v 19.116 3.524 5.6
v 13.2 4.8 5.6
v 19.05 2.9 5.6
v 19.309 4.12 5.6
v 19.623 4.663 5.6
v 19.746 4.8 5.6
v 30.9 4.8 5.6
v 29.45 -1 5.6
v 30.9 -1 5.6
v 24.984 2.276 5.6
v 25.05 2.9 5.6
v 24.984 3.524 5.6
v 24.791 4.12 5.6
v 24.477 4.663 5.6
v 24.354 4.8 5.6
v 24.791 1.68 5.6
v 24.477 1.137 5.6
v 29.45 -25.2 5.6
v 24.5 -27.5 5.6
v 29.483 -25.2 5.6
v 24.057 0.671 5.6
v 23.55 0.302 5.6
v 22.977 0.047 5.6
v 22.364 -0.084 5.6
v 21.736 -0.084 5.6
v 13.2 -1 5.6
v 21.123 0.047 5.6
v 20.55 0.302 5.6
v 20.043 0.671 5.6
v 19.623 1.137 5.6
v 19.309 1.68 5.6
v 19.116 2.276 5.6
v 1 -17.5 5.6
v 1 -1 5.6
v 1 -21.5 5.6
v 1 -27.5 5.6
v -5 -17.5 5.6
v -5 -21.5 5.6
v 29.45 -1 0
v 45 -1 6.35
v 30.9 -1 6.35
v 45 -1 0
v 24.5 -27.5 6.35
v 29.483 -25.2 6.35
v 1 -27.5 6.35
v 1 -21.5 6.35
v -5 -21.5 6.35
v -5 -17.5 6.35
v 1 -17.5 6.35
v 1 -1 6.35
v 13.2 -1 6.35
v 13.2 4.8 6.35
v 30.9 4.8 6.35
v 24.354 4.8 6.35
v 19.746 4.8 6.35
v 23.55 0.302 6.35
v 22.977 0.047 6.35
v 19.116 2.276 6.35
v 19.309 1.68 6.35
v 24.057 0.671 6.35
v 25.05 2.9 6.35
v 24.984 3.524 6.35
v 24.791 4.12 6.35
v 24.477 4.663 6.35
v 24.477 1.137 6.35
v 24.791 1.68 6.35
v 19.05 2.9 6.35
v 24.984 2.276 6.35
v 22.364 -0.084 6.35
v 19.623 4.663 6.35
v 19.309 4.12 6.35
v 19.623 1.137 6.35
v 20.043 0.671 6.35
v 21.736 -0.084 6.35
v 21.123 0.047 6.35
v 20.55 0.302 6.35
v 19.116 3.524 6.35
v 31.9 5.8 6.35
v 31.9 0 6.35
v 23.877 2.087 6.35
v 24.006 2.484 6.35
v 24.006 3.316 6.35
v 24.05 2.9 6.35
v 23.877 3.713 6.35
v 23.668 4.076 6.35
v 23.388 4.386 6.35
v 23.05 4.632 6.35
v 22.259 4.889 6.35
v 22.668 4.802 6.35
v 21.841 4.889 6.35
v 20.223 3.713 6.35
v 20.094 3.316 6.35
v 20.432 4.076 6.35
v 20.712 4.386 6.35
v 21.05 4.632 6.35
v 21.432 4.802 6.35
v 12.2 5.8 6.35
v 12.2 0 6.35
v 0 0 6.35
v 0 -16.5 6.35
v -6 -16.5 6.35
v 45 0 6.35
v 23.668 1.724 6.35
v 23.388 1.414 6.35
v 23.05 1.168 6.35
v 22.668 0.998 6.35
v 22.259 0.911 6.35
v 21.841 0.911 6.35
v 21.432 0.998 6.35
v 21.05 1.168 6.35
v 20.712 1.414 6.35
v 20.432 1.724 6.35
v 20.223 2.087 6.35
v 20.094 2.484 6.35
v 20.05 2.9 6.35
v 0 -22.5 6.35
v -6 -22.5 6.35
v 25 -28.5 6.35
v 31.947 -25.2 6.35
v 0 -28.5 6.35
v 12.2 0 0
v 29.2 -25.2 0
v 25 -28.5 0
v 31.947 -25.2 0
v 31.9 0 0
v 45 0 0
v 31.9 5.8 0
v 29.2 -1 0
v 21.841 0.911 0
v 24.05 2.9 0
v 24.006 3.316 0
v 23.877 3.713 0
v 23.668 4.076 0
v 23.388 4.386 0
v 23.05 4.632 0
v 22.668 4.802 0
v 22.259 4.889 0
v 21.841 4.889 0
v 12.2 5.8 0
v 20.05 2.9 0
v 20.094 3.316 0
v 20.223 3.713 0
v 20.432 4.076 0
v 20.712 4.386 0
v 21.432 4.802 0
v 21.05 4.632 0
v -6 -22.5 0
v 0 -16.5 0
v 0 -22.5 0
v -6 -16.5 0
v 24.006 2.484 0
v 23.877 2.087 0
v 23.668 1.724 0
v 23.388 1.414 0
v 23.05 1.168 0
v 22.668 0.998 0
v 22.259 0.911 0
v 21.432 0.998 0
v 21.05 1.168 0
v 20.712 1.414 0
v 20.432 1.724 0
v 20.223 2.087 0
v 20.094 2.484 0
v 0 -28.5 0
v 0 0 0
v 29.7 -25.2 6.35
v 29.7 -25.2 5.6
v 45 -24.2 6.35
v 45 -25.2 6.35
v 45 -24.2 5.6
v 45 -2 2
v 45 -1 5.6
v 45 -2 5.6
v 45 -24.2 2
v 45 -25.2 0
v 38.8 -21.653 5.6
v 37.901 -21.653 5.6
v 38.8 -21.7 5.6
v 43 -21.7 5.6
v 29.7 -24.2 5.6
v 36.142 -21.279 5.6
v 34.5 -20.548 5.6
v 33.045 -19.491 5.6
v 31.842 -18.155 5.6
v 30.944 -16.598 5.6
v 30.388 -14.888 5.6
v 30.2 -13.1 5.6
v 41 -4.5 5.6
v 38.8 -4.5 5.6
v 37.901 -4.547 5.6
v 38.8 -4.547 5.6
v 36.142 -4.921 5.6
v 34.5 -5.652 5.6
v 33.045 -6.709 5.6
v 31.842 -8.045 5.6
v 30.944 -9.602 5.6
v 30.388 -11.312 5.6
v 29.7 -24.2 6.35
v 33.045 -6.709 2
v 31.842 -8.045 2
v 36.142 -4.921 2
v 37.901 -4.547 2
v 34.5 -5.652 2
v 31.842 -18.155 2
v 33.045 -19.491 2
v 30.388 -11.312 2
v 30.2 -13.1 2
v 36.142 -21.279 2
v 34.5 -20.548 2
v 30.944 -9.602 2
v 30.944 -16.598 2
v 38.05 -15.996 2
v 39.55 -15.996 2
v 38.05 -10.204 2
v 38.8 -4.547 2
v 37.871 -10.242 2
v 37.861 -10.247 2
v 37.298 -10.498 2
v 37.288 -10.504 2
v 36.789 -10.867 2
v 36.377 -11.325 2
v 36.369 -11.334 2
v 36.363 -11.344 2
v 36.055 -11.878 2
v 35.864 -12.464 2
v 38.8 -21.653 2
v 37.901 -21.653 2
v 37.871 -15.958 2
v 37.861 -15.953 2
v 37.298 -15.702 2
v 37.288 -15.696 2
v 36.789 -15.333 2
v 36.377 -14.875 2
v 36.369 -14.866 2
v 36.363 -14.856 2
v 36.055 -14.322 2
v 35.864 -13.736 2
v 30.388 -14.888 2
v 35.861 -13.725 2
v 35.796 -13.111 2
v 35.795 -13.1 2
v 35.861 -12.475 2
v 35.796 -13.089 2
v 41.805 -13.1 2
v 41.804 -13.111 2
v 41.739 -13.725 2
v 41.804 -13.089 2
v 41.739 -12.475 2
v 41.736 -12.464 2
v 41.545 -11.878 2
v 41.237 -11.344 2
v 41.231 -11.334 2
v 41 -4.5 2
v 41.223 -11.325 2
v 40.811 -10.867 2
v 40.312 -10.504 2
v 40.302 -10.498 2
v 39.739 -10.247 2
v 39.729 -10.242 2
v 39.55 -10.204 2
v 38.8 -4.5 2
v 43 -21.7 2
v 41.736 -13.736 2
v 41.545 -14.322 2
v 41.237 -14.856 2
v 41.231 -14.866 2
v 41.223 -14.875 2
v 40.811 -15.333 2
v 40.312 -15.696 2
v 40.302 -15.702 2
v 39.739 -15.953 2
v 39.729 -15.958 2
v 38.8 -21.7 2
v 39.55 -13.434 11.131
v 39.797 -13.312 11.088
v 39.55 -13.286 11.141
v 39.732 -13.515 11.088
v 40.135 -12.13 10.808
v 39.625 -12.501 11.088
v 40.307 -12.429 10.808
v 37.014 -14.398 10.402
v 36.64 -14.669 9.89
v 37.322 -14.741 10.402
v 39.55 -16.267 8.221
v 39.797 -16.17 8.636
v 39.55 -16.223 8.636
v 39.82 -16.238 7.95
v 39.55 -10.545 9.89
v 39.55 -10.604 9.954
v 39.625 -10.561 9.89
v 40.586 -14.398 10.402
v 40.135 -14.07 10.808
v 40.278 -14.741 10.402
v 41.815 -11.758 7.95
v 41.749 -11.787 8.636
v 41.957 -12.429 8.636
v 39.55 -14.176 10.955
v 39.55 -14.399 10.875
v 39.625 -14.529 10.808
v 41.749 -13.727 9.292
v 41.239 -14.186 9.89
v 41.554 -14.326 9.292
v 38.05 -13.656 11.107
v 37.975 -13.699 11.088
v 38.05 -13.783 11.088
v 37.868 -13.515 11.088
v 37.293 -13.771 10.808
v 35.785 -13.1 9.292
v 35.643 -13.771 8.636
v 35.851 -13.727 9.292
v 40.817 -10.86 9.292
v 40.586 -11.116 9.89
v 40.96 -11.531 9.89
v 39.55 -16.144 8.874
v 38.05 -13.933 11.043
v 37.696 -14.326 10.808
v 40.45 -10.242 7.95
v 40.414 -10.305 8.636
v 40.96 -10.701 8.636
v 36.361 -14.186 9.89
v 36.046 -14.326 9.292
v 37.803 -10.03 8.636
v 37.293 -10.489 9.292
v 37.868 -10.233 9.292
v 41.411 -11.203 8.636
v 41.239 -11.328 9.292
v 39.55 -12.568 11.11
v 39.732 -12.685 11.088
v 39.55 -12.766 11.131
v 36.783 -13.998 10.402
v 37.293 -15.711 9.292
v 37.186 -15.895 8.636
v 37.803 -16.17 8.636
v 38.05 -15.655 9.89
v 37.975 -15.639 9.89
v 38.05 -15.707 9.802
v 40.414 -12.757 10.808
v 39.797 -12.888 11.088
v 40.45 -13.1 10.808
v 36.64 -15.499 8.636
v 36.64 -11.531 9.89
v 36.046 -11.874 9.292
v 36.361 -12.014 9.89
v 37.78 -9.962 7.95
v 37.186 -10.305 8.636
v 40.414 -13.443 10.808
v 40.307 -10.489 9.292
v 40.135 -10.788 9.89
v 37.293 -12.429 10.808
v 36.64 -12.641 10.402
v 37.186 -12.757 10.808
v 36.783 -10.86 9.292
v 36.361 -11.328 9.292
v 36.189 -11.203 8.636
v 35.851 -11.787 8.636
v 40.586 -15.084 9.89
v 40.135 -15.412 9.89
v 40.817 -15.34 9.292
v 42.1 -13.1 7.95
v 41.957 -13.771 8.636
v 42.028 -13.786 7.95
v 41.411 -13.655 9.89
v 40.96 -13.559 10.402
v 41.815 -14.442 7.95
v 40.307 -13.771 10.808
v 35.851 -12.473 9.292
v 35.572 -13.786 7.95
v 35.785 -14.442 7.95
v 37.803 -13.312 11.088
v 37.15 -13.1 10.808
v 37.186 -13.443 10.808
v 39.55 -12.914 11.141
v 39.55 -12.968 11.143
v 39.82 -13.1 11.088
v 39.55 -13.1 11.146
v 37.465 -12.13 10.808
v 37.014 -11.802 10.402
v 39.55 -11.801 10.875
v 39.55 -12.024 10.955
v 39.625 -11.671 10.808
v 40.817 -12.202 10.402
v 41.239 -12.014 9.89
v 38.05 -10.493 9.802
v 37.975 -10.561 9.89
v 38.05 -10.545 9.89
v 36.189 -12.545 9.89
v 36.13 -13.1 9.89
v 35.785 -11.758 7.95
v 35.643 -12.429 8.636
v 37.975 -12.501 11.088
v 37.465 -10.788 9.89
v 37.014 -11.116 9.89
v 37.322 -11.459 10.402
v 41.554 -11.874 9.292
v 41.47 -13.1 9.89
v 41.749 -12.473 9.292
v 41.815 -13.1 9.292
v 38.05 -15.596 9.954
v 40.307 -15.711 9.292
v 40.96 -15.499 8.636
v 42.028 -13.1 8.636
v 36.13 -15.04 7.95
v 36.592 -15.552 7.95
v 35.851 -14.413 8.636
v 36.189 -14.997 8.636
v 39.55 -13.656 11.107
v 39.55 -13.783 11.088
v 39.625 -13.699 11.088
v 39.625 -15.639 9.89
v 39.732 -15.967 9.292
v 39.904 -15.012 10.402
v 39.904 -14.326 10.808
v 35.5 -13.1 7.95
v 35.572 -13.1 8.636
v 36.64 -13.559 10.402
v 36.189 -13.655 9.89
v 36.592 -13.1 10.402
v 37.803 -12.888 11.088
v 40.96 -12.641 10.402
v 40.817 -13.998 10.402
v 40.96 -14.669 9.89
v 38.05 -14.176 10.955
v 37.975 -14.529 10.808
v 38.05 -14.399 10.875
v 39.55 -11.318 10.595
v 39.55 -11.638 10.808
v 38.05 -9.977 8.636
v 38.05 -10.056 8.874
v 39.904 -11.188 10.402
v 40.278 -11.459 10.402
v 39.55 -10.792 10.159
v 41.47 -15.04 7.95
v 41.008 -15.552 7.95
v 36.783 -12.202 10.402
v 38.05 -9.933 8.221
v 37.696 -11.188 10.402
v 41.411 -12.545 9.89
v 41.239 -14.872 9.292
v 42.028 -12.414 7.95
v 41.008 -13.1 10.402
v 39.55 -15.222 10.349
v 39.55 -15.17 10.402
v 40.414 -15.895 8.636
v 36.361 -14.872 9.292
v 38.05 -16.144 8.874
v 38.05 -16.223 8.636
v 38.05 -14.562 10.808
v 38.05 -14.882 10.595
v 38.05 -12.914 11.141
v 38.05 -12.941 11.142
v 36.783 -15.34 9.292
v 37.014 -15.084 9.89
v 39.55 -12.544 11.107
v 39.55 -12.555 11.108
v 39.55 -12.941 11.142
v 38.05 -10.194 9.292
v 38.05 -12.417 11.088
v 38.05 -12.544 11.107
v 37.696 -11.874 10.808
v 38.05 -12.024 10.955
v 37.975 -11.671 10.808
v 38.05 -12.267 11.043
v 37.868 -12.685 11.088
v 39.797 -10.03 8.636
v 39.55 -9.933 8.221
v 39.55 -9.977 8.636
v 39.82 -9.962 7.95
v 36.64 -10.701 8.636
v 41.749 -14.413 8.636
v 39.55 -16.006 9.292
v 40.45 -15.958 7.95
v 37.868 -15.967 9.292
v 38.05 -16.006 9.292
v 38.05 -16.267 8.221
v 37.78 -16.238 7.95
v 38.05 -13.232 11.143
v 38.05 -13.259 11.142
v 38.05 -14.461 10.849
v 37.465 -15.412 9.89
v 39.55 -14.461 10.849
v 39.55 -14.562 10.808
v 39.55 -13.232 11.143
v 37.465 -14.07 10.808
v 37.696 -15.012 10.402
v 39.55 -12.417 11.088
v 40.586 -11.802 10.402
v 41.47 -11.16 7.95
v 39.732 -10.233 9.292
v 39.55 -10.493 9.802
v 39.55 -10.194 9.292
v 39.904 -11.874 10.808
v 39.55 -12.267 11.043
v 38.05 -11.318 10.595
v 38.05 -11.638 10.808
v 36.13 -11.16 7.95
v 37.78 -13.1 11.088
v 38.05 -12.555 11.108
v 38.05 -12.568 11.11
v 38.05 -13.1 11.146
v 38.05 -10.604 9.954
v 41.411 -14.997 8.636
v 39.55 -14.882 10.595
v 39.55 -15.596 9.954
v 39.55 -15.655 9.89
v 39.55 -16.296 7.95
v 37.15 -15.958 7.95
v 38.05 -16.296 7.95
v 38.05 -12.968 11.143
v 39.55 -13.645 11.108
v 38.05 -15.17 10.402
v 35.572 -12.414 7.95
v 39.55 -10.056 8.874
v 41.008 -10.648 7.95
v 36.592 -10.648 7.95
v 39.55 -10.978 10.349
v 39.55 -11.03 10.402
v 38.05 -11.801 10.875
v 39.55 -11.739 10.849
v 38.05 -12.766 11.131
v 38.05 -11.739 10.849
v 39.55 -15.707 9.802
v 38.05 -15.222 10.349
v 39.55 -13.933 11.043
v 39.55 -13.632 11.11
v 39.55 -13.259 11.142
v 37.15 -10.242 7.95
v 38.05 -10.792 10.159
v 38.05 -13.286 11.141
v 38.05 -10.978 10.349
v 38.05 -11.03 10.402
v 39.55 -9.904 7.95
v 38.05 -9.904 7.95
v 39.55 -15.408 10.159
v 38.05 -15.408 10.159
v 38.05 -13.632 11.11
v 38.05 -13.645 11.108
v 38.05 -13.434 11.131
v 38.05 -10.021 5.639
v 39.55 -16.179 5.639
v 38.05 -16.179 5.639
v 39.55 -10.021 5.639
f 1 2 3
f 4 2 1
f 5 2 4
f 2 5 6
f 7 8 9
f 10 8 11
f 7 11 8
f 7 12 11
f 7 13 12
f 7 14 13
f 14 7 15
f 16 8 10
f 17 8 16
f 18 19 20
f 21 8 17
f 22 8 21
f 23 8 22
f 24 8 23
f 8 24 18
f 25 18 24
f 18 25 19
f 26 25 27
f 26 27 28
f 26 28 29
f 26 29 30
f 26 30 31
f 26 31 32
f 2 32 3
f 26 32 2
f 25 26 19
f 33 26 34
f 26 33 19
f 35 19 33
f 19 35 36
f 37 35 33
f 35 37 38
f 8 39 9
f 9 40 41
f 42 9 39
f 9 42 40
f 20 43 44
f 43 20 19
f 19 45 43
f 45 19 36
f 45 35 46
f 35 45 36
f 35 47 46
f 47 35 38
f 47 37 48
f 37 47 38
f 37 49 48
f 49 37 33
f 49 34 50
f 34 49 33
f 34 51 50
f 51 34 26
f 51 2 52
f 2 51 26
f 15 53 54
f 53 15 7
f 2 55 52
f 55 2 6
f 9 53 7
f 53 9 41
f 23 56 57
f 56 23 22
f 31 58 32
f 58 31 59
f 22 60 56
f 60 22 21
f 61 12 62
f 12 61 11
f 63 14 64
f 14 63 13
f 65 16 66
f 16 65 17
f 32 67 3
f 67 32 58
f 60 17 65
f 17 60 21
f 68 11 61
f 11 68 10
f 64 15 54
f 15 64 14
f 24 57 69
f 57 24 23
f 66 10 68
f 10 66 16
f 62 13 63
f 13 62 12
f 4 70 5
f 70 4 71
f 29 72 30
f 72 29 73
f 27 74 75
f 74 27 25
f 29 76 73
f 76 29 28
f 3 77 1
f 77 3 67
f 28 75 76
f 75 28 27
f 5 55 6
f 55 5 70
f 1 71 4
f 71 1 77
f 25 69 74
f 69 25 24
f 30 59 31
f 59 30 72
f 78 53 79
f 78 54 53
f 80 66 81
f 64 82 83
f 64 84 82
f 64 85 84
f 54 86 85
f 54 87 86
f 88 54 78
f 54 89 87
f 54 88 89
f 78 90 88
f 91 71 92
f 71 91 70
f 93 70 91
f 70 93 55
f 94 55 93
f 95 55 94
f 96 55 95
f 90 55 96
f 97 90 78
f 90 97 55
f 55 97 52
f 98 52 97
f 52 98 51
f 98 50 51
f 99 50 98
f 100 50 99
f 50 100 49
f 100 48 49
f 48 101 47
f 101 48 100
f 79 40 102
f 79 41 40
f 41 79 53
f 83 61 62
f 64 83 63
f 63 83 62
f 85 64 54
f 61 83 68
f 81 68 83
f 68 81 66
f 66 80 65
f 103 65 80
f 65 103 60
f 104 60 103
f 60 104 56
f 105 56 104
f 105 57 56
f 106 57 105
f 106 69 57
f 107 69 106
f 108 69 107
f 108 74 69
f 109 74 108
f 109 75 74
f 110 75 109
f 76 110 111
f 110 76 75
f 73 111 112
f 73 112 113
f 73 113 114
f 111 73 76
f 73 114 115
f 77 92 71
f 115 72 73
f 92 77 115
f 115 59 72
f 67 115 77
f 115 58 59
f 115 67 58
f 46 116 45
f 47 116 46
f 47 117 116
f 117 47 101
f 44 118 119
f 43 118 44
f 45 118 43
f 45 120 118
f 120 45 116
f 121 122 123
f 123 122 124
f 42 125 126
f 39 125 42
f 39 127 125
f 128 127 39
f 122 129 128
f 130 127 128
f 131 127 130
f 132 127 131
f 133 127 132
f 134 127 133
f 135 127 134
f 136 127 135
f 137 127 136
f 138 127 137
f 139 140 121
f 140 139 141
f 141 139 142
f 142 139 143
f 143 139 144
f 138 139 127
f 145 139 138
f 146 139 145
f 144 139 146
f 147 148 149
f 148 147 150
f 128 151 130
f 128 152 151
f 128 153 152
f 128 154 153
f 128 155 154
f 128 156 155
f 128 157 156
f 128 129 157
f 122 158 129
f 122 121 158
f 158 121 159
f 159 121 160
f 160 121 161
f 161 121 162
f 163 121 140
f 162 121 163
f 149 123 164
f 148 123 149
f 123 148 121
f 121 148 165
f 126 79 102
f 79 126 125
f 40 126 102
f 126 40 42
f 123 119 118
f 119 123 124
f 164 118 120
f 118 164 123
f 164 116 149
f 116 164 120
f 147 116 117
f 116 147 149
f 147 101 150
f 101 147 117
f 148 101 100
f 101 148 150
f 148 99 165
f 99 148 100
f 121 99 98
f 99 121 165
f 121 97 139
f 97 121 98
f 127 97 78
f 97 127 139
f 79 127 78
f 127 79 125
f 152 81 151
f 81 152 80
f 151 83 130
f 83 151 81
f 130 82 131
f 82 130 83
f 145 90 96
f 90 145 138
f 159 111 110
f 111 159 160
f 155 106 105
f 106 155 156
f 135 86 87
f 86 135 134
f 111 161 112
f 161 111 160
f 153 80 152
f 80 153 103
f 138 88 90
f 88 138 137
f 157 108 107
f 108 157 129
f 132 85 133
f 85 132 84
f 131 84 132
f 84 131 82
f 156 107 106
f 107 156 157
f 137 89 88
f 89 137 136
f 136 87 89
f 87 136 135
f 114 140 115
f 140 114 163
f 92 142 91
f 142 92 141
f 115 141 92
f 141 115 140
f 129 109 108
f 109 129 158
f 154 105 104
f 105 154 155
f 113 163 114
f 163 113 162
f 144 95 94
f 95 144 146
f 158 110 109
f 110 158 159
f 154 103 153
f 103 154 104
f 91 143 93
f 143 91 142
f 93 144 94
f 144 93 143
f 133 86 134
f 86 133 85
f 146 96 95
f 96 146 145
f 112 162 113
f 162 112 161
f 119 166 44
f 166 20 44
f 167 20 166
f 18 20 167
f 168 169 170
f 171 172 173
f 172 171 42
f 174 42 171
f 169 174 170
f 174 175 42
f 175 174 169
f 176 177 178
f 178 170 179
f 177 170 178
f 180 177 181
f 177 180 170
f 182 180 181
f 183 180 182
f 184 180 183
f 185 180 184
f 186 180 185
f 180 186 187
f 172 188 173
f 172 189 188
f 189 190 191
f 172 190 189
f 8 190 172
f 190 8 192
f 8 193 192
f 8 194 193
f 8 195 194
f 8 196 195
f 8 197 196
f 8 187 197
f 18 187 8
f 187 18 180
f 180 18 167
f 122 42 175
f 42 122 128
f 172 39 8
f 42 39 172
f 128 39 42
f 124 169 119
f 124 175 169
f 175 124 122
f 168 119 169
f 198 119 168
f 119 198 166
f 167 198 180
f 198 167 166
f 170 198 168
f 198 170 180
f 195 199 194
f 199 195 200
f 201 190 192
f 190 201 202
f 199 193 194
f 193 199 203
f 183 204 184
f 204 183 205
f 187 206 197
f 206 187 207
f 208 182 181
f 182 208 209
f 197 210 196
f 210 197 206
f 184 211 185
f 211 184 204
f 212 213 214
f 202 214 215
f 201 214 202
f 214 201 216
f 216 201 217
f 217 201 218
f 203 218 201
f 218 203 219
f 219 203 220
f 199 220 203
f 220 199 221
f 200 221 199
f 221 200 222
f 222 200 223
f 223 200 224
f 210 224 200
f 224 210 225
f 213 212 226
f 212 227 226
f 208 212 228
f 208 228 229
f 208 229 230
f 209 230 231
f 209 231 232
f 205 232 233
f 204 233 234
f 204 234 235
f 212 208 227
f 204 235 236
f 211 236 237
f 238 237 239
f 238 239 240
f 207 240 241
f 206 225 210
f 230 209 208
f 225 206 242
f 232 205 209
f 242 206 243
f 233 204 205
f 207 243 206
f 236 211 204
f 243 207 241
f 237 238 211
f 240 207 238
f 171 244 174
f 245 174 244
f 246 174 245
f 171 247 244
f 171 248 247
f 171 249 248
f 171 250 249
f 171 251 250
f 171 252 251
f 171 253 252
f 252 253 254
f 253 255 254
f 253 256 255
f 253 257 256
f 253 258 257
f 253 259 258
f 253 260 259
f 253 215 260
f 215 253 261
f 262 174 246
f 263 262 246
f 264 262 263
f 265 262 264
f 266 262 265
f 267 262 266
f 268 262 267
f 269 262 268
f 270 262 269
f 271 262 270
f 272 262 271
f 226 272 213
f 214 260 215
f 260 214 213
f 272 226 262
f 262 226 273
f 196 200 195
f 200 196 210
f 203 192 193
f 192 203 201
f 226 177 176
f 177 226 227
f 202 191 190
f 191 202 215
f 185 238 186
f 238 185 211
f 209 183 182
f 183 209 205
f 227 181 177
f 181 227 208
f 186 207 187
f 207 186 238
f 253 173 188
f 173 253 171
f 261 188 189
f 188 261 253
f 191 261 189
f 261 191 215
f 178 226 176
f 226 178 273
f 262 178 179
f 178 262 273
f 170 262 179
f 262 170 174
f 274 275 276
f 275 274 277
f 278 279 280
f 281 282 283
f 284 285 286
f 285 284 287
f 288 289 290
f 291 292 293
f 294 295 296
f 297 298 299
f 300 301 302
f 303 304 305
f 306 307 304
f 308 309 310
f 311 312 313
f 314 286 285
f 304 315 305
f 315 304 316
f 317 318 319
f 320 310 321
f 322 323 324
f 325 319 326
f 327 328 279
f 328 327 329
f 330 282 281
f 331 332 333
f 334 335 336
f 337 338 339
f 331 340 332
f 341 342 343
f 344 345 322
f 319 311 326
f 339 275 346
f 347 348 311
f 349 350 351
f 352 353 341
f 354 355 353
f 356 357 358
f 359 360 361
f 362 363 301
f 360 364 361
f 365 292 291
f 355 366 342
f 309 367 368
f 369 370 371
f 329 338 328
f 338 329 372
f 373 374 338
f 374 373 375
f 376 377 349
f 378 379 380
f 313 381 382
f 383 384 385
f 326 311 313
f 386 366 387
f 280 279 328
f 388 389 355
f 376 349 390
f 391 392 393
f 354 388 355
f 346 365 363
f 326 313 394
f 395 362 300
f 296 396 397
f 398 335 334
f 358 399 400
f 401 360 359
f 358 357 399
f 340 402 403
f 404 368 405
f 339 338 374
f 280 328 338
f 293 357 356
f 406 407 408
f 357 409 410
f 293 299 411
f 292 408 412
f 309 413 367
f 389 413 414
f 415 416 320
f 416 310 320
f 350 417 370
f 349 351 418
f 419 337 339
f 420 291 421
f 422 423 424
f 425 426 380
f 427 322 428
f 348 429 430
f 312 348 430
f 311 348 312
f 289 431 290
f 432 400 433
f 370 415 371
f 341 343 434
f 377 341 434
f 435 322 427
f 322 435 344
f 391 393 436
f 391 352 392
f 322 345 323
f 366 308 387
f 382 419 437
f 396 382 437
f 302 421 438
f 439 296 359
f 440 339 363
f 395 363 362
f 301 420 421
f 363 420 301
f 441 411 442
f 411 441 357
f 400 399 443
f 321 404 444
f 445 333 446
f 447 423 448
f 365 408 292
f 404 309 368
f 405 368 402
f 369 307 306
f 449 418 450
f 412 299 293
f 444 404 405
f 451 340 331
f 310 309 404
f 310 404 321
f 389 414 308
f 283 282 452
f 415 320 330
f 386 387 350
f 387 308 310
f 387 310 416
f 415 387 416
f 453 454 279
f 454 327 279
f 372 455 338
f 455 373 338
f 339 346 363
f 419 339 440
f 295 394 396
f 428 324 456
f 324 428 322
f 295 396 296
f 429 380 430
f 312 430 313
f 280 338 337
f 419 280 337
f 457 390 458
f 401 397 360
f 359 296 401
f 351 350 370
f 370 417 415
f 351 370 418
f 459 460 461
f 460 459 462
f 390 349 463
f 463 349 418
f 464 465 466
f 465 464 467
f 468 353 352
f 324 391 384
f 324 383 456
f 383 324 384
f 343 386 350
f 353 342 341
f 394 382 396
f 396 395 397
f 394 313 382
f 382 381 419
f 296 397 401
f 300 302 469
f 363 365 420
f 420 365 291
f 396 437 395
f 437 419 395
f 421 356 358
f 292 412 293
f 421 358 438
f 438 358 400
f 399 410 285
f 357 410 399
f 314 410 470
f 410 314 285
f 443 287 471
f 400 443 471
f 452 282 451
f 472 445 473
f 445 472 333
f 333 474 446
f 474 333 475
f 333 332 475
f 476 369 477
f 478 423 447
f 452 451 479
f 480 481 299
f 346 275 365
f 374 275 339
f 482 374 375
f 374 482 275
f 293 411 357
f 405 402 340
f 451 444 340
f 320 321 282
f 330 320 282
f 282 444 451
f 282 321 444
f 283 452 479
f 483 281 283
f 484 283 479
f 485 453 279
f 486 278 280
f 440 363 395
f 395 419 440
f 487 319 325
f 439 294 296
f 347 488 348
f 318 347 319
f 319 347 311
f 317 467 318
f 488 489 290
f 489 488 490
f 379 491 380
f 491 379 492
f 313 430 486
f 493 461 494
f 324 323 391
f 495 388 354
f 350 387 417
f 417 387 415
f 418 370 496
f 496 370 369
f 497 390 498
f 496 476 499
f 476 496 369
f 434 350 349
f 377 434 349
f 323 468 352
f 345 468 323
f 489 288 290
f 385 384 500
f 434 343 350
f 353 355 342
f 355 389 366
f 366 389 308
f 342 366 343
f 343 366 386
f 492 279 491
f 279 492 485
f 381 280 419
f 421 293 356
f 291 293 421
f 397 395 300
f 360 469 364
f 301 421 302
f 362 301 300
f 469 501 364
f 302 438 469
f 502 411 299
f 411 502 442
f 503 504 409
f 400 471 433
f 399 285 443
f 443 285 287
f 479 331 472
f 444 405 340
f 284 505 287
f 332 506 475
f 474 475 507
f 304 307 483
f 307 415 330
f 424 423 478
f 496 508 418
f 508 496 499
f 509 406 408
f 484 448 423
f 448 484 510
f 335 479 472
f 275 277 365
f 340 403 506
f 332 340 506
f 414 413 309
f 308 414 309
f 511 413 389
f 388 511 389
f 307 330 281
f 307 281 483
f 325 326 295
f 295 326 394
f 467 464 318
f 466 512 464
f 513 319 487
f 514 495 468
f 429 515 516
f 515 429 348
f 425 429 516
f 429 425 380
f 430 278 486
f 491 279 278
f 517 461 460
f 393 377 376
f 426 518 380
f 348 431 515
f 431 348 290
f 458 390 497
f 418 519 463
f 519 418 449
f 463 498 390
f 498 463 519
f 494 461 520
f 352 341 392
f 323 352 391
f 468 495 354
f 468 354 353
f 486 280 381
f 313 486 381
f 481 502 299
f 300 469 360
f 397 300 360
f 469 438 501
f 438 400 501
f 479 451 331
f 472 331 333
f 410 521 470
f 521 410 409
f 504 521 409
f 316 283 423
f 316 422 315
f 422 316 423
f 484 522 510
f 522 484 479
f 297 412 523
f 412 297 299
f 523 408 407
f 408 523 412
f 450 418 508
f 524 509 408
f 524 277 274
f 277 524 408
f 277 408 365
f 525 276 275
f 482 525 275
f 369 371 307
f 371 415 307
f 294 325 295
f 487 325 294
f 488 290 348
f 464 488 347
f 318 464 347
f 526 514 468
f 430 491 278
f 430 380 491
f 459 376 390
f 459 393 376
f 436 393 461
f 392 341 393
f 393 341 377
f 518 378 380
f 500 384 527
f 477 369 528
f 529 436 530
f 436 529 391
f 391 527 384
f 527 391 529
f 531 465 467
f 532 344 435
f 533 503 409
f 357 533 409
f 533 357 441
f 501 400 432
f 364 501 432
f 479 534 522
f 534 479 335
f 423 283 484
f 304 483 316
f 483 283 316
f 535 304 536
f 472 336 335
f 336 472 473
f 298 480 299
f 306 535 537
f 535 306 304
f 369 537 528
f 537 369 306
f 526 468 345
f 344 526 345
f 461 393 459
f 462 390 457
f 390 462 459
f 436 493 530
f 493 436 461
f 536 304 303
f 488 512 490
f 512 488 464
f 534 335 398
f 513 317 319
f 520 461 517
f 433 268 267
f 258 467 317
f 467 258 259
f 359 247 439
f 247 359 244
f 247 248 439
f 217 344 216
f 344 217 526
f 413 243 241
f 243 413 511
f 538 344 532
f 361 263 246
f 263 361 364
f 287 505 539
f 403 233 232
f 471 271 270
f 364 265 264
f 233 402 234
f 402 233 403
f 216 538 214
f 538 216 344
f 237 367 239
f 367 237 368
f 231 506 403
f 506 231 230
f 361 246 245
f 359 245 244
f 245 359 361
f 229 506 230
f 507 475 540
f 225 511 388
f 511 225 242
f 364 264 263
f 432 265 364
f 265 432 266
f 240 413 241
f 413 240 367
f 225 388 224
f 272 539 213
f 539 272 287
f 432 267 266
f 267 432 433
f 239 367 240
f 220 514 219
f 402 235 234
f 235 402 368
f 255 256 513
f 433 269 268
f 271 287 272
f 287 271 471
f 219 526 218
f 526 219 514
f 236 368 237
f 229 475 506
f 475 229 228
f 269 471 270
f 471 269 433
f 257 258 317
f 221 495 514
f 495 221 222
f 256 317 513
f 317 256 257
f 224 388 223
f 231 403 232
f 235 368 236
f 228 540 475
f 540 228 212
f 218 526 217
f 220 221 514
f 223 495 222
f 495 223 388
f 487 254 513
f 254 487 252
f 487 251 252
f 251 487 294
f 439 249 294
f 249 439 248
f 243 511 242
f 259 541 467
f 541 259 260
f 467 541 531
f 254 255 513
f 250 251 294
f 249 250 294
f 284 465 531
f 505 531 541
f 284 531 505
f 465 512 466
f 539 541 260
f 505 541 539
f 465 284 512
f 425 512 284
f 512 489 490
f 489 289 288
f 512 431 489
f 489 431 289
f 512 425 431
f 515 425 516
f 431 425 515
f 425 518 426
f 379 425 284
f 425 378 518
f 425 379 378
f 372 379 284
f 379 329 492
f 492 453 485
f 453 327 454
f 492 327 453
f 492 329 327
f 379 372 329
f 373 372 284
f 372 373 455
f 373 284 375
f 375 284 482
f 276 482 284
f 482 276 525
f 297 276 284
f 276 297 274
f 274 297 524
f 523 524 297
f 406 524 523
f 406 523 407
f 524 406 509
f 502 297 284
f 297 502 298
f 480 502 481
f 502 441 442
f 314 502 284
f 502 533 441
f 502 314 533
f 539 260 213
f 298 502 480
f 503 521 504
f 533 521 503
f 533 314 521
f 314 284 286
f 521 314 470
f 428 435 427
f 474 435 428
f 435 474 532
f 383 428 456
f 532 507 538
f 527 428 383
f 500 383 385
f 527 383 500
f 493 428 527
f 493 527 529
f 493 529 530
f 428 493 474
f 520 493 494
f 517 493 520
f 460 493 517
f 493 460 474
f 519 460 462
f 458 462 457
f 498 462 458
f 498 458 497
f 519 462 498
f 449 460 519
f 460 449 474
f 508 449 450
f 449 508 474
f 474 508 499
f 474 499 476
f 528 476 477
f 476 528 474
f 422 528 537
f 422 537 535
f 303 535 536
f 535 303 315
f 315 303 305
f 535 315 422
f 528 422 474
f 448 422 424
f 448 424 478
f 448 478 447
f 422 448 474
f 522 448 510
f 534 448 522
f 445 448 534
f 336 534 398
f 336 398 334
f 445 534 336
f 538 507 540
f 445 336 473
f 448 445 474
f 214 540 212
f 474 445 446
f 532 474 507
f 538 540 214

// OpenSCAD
// Which side? Primarily for determining which side to make fancy
side="left";

// Cut hole for a servo - useful for auto-z-levelling
// Also specify the dimensions of the servo hole
servo_hole=false;
servo_width=23.5;  // Width of cutout for servo
servo_height=12.5; // Height of cutout for servo
servo_bolt_size=3; // Diameter of bolt shaft

// Cut the hole for the X end-stop screw
endstop_hole=false;

// Cut holes for a lower accessory
accessory_holes=false;
accessory_bolt_size=2;
accessory_hole_centres=15;

// Depth Gauge Mount
depth_gauge=true;

// Fancy the shape up a bit?
fancy=true;
fancy_border_size=1;
fancy_border_inset=0.75;


// Panel thickness
t=6.35;

// Jitter. This should be much less than one layer height.
j=0.05;



// Side panel with the various holes cut out
module SidePanel()
{
	translate([0, 0, t])
	rotate([180, 0, 0])
	difference()
	{
		SidePanelBody();

		// Main mounting bolt hole
		translate([22.05, -2.9, -j]) 
		cylinder(h=t+j+j, r=2, $fn=30);

		// X Endstop bolt hole
		if(endstop_hole) {
			translate([17.9, 13.3, -j])
			cylinder(h=t+j+j, r=1.5,$fn=30);
		}

		// Servo hole
		if(servo_hole) {
			translate([22.5, 14.25, t/2]) 
			ServoHoleFormer();
		}
		
		// Accessory holes
		if(accessory_holes)
		{
			translate([5, 28.5-accessory_bolt_size/2-fancy_border_size, -j])
			cylinder(h=t+j+j, r=accessory_bolt_size/2, $fn=30);

			translate([5+accessory_hole_centres, 28.5-accessory_bolt_size/2-fancy_border_size, -j])
			cylinder(h=t+j+j, r=accessory_bolt_size/2, $fn=30);
		}

		// Take out the space where the depth-gauge mount will go
		if(depth_gauge)
		{
			translate([29.4+j, 1, -j])
			cube([15.8, 24.2, t+j+j]);
		}
	}
	
	if(depth_gauge)
	{
		color([0.8,0.2,0.2])
		translate([38.8, -13.1, 0])
		DepthGaugeMountBlock();
	}
}


module DepthGaugePinFormer(r_major)
{
	union()
	{
		cylinder(r=r_major, h=t, $fn=30);
		
		linear_extrude(height=t) 
		polygon(points=[
			[0, -r_major], // 0
			[4.2, -r_major], // 1
			[6.2, -11.1], // 2
			[10.2, -11.1], // 2a
			[10.2, 11.1], // 3a
			[6.2, 11.1], // 3
			[2.2, r_major], // 4
			[0, r_major] // 5
		]);
	}
}

module DepthGaugeMountBlock()
{
	r_major=8.6;
	
	difference()
	{
		difference()
		{
			if(fancy)
			{
				translate([-r_major-1, -12.1, 0])
				union()
				{
					cube([r_major+1+6.2, 24.2, t-fancy_border_inset]);
					translate([fancy_border_size/2, 0, t-fancy_border_inset-j]) cube([r_major+1+6.2-fancy_border_size/2, fancy_border_size, fancy_border_inset+j]);
				}
			}
			else
			{
				translate([-r_major-1, -12.1, 0])
				cube([r_major+1+6.2, 24.2, t]);
			}
		}
		
		// Pin Former
		translate([0, 0, 2])
		DepthGaugePinFormer(r_major);
	}
	
	// Pin
	shaft_size=3;
	shaft_length=5*1.2;
	head_size=3.3;
	slot_size=1.5;

	translate([0, 0, 2-j])
	difference()
	{
		union()
		{	
			// Stalk
			translate([0,0,-j]) cylinder(r1=shaft_size, r2=head_size, h=shaft_length+j, $fn=30);

			// Cap
			translate([0, 0, shaft_length]) 
			intersection()
			{
				sphere(r=head_size, $fn=30);
				translate([0, 0, head_size/2]) cube([head_size*2, head_size*2, head_size], center=true);
			}
		}
		translate([-slot_size/2, -head_size-j, 0]) cube([slot_size, head_size*2+j+j, shaft_length+head_size+j]);
	}
}

module FancyFormer()
{
	b=fancy_border_size;
	d=fancy_border_inset;
	
	difference()
	{
		translate([0, 0, -d])
		linear_extrude(height=2*d) 
		polygon(points=[
			[b, b],              // 0
			[12.2+b, b],         // 1
			[12.2+b, -5.8+b],    // 2
			[31.9-b, -5.8+b],    // 3
			[31.9-b, b],         // 4
			[45-b, b],           // 5
			[45-b, 19-(b*0.5)],  // 6
			[25-(b*0.5), 28.5-b],// 7
			[b, 28.5-b],         // 8
			[b, 22.5-b],         // 9
			[-6+b, 22.5-b],      //10
			[-6+b, 16.5+b],      //11
			[b, 16.5+b]          //12
		]);

		// Mount hole
		translate([22.05, -2.9, 0]) cylinder(h=d*2+j+j, r=2+b, $fn=30, center=true);

		// End-stop hole
		if(endstop_hole)
		{
			translate([17.9, 13.3, 0])
			cylinder(h=d+j+j, r=1.5+b, $fn=30, center=true);
		}
		
		// Servo holes
		if(servo_hole)
		{
			translate([22.5, 14.25, t/2])
			union()
			{
				cube([servo_width+b+b, servo_height+b+b, t+j+j], true);
				translate([servo_width/2 + servo_bolt_size/2 +1, 0, 0])
				cylinder(h=t+j+j, r=servo_bolt_size/2+b, $fn=30, center=true);

				translate([-servo_width/2 - servo_bolt_size/2-1, 0, 0])
				cylinder(h=t+j+j, r=servo_bolt_size/2+b, $fn=30, center=true);
			}
		}
		
		// Accessory holes
		if(accessory_holes)
		{
			translate([5, 28.5-accessory_bolt_size/2-b, -j])
			cylinder(h=t+j+j, r=accessory_bolt_size/2+b, $fn=30);

			translate([5+accessory_hole_centres, 28.5-accessory_bolt_size/2-b, -j])
			cylinder(h=t+j+j, r=accessory_bolt_size/2+b, $fn=30);
		}

	}
}

// Main body of the side panel
module SidePanelBody()
{
	color([0.8,0.2,0.2])
	difference()
	{
		linear_extrude(height=t) 
		polygon(points=[
			[0, 0],       // 0
			[12.2, 0],    // 1
			[12.2, -5.8], // 2
			[31.9, -5.8], // 3
			[31.9, 0],    // 4
			[45, 0],      // 5
			[45, 19],     // 6
			[25, 28.5],   // 7
			[0, 28.5],    // 8
			[0, 22.5],    // 9
			[-6, 22.5],   //10
			[-6, 16.5],   //11
			[0, 16.5]     //12
		]);

		if(fancy)
		{
			union()
			{
				if(side=="left")
				{
					FancyFormer();
				}
				if(side=="right")
				{
					translate([0, 0, t]) FancyFormer();
				}
			}
		}


	}
}


module ServoHoleFormer()
{
	cube([servo_width, servo_height, t+j+j], true);

	translate([servo_width/2 + servo_bolt_size/2 +1, 0, 0])
	cylinder(h=t+j+j, r=servo_bolt_size/2, $fn=30, center=true);

	translate([-servo_width/2 - servo_bolt_size/2-1, 0, 0])
	cylinder(h=t+j+j, r=servo_bolt_size/2, $fn=30, center=true);
}



if(side == "left")
{
	//DepthGaugeMountBlock();
	SidePanel();
}
else
{
	translate([0, 0, t]) rotate([180, 0, 0]) SidePanel();
}
